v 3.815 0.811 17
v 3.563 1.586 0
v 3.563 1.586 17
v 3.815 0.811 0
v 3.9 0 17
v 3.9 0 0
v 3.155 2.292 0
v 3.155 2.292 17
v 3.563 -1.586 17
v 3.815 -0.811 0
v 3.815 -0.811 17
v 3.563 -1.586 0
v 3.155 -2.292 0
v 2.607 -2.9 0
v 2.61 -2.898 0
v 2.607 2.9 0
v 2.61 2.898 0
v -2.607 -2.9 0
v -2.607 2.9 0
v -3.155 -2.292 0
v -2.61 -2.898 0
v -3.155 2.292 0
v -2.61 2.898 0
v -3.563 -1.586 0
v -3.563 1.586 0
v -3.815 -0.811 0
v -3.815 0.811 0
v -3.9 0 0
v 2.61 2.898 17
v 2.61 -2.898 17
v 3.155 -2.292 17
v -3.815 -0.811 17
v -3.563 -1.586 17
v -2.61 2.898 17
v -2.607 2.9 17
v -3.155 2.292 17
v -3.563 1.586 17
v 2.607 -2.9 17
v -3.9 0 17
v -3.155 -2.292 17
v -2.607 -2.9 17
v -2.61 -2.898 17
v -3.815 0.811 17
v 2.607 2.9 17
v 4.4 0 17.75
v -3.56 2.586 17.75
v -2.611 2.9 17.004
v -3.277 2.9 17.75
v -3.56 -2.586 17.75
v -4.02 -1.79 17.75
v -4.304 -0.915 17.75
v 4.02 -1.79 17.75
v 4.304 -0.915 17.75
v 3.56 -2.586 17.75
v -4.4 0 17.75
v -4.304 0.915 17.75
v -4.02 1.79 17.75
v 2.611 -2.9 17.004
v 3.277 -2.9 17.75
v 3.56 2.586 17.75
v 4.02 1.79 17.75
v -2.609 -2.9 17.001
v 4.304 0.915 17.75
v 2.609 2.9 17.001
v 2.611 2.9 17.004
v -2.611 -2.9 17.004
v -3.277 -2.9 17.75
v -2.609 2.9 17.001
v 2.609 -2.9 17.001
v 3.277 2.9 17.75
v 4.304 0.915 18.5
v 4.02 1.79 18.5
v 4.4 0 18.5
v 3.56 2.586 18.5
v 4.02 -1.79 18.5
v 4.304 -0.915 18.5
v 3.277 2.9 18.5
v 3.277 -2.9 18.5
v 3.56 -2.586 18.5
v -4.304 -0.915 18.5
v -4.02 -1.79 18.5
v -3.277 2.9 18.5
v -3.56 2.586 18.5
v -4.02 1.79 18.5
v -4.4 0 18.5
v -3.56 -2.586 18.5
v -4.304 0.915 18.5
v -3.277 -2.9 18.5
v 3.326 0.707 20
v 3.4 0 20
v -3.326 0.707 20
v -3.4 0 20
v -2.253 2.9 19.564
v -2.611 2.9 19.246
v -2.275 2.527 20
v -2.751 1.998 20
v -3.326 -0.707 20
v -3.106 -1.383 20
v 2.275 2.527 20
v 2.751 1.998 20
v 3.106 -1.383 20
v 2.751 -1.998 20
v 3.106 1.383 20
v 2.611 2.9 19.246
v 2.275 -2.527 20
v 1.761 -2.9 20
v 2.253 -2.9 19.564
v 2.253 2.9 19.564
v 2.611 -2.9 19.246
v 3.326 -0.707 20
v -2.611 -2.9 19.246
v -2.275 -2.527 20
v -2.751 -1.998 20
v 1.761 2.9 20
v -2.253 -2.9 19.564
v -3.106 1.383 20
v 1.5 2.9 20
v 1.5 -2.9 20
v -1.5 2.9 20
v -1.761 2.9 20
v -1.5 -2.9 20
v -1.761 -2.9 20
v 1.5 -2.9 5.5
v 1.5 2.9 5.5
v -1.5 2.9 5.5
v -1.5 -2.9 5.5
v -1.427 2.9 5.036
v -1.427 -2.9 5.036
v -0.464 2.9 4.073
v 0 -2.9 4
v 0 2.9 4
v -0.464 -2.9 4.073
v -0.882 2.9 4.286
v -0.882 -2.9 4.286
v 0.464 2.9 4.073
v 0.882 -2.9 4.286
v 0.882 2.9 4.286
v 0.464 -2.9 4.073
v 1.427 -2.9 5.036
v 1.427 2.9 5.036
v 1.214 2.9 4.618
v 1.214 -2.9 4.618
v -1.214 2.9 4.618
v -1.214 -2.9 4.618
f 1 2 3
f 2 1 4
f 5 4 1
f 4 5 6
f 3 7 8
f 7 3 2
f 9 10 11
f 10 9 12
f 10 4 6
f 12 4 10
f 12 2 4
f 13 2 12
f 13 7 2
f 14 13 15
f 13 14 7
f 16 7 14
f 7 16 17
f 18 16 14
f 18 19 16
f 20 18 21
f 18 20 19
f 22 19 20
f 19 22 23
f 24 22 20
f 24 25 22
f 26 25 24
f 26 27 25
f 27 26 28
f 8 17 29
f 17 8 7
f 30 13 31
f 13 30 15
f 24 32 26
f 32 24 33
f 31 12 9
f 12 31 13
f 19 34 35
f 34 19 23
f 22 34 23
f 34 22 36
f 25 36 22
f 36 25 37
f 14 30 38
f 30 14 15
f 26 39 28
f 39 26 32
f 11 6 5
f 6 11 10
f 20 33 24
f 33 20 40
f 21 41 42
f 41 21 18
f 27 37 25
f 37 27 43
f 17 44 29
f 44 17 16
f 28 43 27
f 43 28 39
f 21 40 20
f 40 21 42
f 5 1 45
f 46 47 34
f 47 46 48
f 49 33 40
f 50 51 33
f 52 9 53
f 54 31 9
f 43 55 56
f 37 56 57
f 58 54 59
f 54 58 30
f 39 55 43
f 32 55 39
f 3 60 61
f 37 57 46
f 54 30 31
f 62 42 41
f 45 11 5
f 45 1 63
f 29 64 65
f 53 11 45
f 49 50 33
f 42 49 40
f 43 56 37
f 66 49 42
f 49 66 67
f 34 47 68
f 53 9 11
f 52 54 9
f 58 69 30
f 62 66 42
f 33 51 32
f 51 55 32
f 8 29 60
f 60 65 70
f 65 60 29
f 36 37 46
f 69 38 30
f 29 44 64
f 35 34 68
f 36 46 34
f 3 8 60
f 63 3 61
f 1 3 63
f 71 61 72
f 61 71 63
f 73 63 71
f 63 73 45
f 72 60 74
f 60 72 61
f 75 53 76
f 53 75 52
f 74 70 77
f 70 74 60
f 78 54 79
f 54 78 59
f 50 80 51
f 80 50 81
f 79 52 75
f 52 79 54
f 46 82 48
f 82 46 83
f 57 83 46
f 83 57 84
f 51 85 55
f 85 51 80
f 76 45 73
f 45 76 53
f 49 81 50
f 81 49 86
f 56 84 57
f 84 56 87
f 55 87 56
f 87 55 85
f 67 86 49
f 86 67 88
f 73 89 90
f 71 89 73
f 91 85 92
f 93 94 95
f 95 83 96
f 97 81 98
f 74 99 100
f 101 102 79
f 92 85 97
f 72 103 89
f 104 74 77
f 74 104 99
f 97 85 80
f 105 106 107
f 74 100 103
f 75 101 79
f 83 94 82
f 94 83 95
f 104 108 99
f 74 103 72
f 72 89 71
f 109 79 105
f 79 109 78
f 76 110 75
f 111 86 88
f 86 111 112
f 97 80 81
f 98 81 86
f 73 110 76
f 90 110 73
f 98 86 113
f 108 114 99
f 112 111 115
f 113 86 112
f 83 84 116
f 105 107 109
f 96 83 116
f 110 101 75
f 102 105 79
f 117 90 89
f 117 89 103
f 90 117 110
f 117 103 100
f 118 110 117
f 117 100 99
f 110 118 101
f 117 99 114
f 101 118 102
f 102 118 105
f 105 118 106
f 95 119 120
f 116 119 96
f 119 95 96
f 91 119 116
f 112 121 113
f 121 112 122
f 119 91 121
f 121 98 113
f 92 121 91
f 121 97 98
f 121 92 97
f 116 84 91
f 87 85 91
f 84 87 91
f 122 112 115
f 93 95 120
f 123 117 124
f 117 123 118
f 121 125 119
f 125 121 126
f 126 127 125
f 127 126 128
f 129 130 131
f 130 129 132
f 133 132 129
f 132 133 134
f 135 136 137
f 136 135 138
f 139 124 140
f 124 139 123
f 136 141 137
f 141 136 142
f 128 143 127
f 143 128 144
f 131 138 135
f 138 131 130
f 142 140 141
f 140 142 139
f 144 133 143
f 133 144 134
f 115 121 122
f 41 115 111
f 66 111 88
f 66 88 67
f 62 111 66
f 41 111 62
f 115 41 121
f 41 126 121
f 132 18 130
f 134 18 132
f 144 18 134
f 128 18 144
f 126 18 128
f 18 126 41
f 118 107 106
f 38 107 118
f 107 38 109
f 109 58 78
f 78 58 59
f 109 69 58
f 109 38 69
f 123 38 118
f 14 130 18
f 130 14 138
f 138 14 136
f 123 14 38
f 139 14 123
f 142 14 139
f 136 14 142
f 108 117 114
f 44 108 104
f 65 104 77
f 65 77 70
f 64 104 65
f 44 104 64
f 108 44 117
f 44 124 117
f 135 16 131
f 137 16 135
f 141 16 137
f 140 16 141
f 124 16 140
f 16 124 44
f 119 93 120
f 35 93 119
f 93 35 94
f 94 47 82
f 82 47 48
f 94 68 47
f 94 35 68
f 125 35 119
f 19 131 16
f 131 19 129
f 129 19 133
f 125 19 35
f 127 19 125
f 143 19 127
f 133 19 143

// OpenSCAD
// Pin Connectors V3
// Tony Buser <tbuser@gmail.com>
// Modified by Emmett Lalish

object=0;//[0:pin,1:pinpeg,2:pinhole]
length=20;
diameter=8;
//Only affects pinhole
hole_twist=0;//[0:free,1:fixed]
//Only affects pinhole
hole_friction=0;//[0:loose,1:tight]
//Radial gap to help pins fit into tight holes
pin_tolerance=0.2;
//Extra gap to make loose hole
loose=0.3;
lip_height=3;
lip_thickness=1;
hf=hole_friction==0 ? false : true;
ht=hole_twist==0 ? false : true;

if(object==0)pin(h=length,r=diameter/2,lh=lip_height,lt=lip_thickness,t=pin_tolerance);
if(object==1)pinpeg(h=length,r=diameter/2,lh=lip_height,lt=lip_thickness,t=pin_tolerance);
if(object==2)pinhole(h=length,r=diameter/2,lh=lip_height,lt=lip_thickness,t=loose,
	tight=hf,fixed=ht);

module test() {
  tolerance = 0.3;
  
  translate([-12, 12, 0]) pinpeg(h=20);
  translate([12, 12, 0]) pintack(h=10);
  
  difference() {
    union() {
      translate([0, -12, 2.5]) cube(size = [59, 20, 5], center = true);
      translate([24, -12, 7.5]) cube(size = [12, 20, 15], center = true);
    }
    translate([-24, -12, 0]) pinhole(h=5, t=tolerance);
    translate([-12, -12, 0]) pinhole(h=5, t=tolerance, tight=false);
    translate([0, -12, 0]) pinhole(h=10, t=tolerance);
    translate([12, -12, 0]) pinhole(h=10, t=tolerance, tight=false);
    translate([24, -12, 15]) rotate([0, 180, 0]) pinhole(h=10, t=tolerance);
  }
}

module pinhole(h=10, r=4, lh=3, lt=1, t=0.3, tight=true, fixed=false) {
  // h = shaft height
  // r = shaft radius
  // lh = lip height
  // lt = lip thickness
  // t = extra tolerance for loose fit
  // tight = set to false if you want a joint that spins easily
  // fixed = set to true so pins can't spin
  
intersection(){
  union() {
	if (tight == true || fixed == true) {
      pin_solid(h, r, lh, lt);
	  translate([0,0,-t/2])cylinder(h=h+t, r=r, $fn=30);
	} else {
	  pin_solid(h, r+t/2, lh, lt);
	  translate([0,0,-t/2])cylinder(h=h+t, r=r+t/2, $fn=30);
	}
    
    
    // widen the entrance hole to make insertion easier
    //translate([0, 0, -0.1]) cylinder(h=lh/3, r2=r, r1=r+(t/2)+(lt/2),$fn=30);
  }
  if (fixed == true) {
	translate([-r*2, -r*0.75, -1])cube([r*4, r*1.5, h+2]);
  }
}}

module pin(h=10, r=4, lh=3, lt=1, t=0.2, side=false) {
  // h = shaft height
  // r = shaft radius
  // lh = lip height
  // lt = lip thickness
  // side = set to true if you want it printed horizontally

  if (side) {
    pin_horizontal(h, r, lh, lt, t);
  } else {
    pin_vertical(h, r, lh, lt, t);
  }
}

module pintack(h=10, r=4, lh=3, lt=1, t=0.2, bh=3, br=8.75) {
  // bh = base_height
  // br = base_radius
  
  union() {
    cylinder(h=bh, r=br);
    translate([0, 0, bh]) pin(h, r, lh, lt, t);
  }
}

module pinpeg(h=20, r=4, lh=3, lt=1, t=0.2) {
  union() {
    translate([0,-0.05, 0]) pin(h/2+0.1, r, lh, lt, t, side=true);
    translate([0,0.05, 0]) rotate([0, 0, 180]) pin(h/2+0.1, r, lh, lt, t, side=true);
  }
}

// just call pin instead, I made this module because it was easier to do the rotation option this way
// since openscad complains of recursion if I did it all in one module
module pin_vertical(h=10, r=4, lh=3, lt=1, t=0.2) {
  // h = shaft height
  // r = shaft radius
  // lh = lip height
  // lt = lip thickness

  difference() {
    pin_solid(h, r-t/2, lh, lt);
    
    // center cut
    translate([-lt*3/2, -(r*2+lt*2)/2, h/5+lt*3/2]) cube([lt*3, r*2+lt*2, h]);
    //translate([0, 0, h/4]) cylinder(h=h+lh, r=r/2.5, $fn=20);
    // center curve
    translate([0, 0, h/5+lt*3/2]) rotate([90, 0, 0]) cylinder(h=r*2, r=lt*3/2, center=true, $fn=20);
  
    // side cuts
    translate([-r*2, -r-r*0.75+t/2, -1]) cube([r*4, r, h+2]);
    translate([-r*2, r*0.75-t/2, -1]) cube([r*4, r, h+2]);
  }
}

// call pin with side=true instead of this
module pin_horizontal(h=10, r=4, lh=3, lt=1, t=0.2) {
  // h = shaft height
  // r = shaft radius
  // lh = lip height
  // lt = lip thickness
  translate([0, 0, r*0.75-t/2]) rotate([-90, 0, 0]) pin_vertical(h, r, lh, lt, t);
}

// this is mainly to make the pinhole module easier
module pin_solid(h=10, r=4, lh=3, lt=1) {
  union() {
    // shaft
    cylinder(h=h-lh, r=r, $fn=30);
    // lip
    // translate([0, 0, h-lh]) cylinder(h=lh*0.25, r1=r, r2=r+(lt/2), $fn=30);
    // translate([0, 0, h-lh+lh*0.25]) cylinder(h=lh*0.25, r2=r, r1=r+(lt/2), $fn=30);
    // translate([0, 0, h-lh+lh*0.50]) cylinder(h=lh*0.50, r1=r, r2=r-(lt/2), $fn=30);

    // translate([0, 0, h-lh]) cylinder(h=lh*0.50, r1=r, r2=r+(lt/2), $fn=30);
    // translate([0, 0, h-lh+lh*0.50]) cylinder(h=lh*0.50, r1=r+(lt/2), r2=r-(lt/3), $fn=30);    

    translate([0, 0, h-lh]) cylinder(h=lh*0.25, r1=r, r2=r+(lt/2), $fn=30);
    translate([0, 0, h-lh+lh*0.25]) cylinder(h=lh*0.25, r=r+(lt/2), $fn=30);    
    translate([0, 0, h-lh+lh*0.50]) cylinder(h=lh*0.50, r1=r+(lt/2), r2=r-(lt/2), $fn=30);    

    // translate([0, 0, h-lh]) cylinder(h=lh, r1=r+(lt/2), r2=1, $fn=30);
    // translate([0, 0, h-lh-lt/2]) cylinder(h=lt/2, r1=r, r2=r+(lt/2), $fn=30);
  }
}

module pinshaft(h=10, r=4, t=0.2, side=false){
flip=side ? 1 : 0;
translate(flip*[0,h/2,r*0.75-t/2])rotate(flip*[90,0,0])
intersection(){
	cylinder(h=h, r=r-t/2, $fn=30);
	translate([-r*2, -r*0.75+t/2, -1])cube([r*4, r*1.5-t, h+2]);
}
}
